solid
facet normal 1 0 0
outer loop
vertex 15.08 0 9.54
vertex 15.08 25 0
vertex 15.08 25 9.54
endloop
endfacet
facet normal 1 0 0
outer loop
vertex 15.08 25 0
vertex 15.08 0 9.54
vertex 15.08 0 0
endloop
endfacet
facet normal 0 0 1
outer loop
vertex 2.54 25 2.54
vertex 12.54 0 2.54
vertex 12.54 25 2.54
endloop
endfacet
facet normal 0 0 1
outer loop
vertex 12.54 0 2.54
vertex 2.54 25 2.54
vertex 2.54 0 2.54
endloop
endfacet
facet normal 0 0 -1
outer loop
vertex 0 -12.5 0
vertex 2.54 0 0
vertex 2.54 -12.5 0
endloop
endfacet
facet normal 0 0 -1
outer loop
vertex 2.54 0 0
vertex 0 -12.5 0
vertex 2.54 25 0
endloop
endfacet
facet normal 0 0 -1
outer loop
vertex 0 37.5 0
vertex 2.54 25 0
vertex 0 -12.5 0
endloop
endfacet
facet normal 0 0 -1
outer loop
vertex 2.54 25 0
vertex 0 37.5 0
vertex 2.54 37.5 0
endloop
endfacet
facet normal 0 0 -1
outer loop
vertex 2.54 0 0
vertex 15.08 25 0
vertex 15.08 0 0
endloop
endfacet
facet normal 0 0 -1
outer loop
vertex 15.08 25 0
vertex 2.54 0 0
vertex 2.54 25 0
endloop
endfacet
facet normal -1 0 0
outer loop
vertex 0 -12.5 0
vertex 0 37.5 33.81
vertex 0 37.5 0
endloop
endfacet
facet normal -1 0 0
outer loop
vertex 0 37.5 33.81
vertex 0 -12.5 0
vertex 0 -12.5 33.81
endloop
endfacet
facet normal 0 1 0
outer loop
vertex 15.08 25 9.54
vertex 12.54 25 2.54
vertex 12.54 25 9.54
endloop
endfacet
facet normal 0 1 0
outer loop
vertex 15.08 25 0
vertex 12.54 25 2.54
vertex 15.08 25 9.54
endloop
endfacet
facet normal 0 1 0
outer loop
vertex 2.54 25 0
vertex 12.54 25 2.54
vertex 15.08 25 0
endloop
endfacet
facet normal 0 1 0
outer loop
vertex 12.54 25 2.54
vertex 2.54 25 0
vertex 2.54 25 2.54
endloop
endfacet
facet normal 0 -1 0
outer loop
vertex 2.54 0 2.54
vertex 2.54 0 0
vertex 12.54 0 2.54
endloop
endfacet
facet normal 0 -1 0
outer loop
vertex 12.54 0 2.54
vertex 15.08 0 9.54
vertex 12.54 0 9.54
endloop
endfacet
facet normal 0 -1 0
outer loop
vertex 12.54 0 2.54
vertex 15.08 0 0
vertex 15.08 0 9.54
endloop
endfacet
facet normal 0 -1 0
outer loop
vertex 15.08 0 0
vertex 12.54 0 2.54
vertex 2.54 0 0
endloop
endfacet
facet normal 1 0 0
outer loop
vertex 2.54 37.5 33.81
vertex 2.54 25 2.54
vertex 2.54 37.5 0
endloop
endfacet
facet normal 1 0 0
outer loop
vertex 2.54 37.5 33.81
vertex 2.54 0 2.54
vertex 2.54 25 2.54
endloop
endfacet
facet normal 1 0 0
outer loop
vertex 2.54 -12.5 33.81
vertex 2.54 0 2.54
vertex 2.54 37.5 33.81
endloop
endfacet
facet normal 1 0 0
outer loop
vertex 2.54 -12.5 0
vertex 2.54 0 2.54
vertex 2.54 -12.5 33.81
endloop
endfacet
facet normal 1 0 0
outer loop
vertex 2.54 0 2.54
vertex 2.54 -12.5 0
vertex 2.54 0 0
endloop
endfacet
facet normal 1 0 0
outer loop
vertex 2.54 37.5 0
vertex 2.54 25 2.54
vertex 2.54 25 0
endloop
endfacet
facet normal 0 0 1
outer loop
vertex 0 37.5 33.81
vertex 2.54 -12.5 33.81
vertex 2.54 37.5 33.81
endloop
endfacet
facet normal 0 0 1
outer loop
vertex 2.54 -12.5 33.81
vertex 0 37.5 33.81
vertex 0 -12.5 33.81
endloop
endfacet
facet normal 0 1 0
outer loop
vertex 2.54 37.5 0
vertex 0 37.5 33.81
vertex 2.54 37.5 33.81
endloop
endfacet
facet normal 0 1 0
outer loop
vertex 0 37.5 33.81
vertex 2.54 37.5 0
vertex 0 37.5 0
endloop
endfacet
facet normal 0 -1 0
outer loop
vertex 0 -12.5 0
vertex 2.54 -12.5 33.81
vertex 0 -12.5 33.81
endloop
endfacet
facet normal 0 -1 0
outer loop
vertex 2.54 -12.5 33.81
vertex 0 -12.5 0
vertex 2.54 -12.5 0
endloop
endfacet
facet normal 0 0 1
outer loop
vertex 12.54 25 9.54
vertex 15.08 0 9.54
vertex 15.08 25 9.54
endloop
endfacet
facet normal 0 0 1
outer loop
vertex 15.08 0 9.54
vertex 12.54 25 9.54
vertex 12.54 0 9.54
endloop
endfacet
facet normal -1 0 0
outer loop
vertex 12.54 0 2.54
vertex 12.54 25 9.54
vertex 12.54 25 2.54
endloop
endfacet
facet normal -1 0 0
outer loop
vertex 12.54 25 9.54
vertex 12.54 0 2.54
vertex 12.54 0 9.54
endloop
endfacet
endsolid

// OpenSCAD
$fn=36;
//Wanddicke
wd=2.54;
//Abstand in Display
aid=7;
//Abstand hinter Tablet
ahd=20;
//Dicke dickstes Tablet
ddt=10;
//Breite Montageband
bm=25;

module abstandhalter()
{
    cube([ddt+2*wd,bm,wd]);
}

abstandhalter();

module hintertablet()
{
    translate([0,-bm/2,0])
    cube([wd,bm*2,(wd+ahd)*1.5]);
}

hintertablet();

module vortablet()
{
    translate([ddt+wd,0,0])
    cube([wd,bm,wd+aid]);
}

vortablet();
